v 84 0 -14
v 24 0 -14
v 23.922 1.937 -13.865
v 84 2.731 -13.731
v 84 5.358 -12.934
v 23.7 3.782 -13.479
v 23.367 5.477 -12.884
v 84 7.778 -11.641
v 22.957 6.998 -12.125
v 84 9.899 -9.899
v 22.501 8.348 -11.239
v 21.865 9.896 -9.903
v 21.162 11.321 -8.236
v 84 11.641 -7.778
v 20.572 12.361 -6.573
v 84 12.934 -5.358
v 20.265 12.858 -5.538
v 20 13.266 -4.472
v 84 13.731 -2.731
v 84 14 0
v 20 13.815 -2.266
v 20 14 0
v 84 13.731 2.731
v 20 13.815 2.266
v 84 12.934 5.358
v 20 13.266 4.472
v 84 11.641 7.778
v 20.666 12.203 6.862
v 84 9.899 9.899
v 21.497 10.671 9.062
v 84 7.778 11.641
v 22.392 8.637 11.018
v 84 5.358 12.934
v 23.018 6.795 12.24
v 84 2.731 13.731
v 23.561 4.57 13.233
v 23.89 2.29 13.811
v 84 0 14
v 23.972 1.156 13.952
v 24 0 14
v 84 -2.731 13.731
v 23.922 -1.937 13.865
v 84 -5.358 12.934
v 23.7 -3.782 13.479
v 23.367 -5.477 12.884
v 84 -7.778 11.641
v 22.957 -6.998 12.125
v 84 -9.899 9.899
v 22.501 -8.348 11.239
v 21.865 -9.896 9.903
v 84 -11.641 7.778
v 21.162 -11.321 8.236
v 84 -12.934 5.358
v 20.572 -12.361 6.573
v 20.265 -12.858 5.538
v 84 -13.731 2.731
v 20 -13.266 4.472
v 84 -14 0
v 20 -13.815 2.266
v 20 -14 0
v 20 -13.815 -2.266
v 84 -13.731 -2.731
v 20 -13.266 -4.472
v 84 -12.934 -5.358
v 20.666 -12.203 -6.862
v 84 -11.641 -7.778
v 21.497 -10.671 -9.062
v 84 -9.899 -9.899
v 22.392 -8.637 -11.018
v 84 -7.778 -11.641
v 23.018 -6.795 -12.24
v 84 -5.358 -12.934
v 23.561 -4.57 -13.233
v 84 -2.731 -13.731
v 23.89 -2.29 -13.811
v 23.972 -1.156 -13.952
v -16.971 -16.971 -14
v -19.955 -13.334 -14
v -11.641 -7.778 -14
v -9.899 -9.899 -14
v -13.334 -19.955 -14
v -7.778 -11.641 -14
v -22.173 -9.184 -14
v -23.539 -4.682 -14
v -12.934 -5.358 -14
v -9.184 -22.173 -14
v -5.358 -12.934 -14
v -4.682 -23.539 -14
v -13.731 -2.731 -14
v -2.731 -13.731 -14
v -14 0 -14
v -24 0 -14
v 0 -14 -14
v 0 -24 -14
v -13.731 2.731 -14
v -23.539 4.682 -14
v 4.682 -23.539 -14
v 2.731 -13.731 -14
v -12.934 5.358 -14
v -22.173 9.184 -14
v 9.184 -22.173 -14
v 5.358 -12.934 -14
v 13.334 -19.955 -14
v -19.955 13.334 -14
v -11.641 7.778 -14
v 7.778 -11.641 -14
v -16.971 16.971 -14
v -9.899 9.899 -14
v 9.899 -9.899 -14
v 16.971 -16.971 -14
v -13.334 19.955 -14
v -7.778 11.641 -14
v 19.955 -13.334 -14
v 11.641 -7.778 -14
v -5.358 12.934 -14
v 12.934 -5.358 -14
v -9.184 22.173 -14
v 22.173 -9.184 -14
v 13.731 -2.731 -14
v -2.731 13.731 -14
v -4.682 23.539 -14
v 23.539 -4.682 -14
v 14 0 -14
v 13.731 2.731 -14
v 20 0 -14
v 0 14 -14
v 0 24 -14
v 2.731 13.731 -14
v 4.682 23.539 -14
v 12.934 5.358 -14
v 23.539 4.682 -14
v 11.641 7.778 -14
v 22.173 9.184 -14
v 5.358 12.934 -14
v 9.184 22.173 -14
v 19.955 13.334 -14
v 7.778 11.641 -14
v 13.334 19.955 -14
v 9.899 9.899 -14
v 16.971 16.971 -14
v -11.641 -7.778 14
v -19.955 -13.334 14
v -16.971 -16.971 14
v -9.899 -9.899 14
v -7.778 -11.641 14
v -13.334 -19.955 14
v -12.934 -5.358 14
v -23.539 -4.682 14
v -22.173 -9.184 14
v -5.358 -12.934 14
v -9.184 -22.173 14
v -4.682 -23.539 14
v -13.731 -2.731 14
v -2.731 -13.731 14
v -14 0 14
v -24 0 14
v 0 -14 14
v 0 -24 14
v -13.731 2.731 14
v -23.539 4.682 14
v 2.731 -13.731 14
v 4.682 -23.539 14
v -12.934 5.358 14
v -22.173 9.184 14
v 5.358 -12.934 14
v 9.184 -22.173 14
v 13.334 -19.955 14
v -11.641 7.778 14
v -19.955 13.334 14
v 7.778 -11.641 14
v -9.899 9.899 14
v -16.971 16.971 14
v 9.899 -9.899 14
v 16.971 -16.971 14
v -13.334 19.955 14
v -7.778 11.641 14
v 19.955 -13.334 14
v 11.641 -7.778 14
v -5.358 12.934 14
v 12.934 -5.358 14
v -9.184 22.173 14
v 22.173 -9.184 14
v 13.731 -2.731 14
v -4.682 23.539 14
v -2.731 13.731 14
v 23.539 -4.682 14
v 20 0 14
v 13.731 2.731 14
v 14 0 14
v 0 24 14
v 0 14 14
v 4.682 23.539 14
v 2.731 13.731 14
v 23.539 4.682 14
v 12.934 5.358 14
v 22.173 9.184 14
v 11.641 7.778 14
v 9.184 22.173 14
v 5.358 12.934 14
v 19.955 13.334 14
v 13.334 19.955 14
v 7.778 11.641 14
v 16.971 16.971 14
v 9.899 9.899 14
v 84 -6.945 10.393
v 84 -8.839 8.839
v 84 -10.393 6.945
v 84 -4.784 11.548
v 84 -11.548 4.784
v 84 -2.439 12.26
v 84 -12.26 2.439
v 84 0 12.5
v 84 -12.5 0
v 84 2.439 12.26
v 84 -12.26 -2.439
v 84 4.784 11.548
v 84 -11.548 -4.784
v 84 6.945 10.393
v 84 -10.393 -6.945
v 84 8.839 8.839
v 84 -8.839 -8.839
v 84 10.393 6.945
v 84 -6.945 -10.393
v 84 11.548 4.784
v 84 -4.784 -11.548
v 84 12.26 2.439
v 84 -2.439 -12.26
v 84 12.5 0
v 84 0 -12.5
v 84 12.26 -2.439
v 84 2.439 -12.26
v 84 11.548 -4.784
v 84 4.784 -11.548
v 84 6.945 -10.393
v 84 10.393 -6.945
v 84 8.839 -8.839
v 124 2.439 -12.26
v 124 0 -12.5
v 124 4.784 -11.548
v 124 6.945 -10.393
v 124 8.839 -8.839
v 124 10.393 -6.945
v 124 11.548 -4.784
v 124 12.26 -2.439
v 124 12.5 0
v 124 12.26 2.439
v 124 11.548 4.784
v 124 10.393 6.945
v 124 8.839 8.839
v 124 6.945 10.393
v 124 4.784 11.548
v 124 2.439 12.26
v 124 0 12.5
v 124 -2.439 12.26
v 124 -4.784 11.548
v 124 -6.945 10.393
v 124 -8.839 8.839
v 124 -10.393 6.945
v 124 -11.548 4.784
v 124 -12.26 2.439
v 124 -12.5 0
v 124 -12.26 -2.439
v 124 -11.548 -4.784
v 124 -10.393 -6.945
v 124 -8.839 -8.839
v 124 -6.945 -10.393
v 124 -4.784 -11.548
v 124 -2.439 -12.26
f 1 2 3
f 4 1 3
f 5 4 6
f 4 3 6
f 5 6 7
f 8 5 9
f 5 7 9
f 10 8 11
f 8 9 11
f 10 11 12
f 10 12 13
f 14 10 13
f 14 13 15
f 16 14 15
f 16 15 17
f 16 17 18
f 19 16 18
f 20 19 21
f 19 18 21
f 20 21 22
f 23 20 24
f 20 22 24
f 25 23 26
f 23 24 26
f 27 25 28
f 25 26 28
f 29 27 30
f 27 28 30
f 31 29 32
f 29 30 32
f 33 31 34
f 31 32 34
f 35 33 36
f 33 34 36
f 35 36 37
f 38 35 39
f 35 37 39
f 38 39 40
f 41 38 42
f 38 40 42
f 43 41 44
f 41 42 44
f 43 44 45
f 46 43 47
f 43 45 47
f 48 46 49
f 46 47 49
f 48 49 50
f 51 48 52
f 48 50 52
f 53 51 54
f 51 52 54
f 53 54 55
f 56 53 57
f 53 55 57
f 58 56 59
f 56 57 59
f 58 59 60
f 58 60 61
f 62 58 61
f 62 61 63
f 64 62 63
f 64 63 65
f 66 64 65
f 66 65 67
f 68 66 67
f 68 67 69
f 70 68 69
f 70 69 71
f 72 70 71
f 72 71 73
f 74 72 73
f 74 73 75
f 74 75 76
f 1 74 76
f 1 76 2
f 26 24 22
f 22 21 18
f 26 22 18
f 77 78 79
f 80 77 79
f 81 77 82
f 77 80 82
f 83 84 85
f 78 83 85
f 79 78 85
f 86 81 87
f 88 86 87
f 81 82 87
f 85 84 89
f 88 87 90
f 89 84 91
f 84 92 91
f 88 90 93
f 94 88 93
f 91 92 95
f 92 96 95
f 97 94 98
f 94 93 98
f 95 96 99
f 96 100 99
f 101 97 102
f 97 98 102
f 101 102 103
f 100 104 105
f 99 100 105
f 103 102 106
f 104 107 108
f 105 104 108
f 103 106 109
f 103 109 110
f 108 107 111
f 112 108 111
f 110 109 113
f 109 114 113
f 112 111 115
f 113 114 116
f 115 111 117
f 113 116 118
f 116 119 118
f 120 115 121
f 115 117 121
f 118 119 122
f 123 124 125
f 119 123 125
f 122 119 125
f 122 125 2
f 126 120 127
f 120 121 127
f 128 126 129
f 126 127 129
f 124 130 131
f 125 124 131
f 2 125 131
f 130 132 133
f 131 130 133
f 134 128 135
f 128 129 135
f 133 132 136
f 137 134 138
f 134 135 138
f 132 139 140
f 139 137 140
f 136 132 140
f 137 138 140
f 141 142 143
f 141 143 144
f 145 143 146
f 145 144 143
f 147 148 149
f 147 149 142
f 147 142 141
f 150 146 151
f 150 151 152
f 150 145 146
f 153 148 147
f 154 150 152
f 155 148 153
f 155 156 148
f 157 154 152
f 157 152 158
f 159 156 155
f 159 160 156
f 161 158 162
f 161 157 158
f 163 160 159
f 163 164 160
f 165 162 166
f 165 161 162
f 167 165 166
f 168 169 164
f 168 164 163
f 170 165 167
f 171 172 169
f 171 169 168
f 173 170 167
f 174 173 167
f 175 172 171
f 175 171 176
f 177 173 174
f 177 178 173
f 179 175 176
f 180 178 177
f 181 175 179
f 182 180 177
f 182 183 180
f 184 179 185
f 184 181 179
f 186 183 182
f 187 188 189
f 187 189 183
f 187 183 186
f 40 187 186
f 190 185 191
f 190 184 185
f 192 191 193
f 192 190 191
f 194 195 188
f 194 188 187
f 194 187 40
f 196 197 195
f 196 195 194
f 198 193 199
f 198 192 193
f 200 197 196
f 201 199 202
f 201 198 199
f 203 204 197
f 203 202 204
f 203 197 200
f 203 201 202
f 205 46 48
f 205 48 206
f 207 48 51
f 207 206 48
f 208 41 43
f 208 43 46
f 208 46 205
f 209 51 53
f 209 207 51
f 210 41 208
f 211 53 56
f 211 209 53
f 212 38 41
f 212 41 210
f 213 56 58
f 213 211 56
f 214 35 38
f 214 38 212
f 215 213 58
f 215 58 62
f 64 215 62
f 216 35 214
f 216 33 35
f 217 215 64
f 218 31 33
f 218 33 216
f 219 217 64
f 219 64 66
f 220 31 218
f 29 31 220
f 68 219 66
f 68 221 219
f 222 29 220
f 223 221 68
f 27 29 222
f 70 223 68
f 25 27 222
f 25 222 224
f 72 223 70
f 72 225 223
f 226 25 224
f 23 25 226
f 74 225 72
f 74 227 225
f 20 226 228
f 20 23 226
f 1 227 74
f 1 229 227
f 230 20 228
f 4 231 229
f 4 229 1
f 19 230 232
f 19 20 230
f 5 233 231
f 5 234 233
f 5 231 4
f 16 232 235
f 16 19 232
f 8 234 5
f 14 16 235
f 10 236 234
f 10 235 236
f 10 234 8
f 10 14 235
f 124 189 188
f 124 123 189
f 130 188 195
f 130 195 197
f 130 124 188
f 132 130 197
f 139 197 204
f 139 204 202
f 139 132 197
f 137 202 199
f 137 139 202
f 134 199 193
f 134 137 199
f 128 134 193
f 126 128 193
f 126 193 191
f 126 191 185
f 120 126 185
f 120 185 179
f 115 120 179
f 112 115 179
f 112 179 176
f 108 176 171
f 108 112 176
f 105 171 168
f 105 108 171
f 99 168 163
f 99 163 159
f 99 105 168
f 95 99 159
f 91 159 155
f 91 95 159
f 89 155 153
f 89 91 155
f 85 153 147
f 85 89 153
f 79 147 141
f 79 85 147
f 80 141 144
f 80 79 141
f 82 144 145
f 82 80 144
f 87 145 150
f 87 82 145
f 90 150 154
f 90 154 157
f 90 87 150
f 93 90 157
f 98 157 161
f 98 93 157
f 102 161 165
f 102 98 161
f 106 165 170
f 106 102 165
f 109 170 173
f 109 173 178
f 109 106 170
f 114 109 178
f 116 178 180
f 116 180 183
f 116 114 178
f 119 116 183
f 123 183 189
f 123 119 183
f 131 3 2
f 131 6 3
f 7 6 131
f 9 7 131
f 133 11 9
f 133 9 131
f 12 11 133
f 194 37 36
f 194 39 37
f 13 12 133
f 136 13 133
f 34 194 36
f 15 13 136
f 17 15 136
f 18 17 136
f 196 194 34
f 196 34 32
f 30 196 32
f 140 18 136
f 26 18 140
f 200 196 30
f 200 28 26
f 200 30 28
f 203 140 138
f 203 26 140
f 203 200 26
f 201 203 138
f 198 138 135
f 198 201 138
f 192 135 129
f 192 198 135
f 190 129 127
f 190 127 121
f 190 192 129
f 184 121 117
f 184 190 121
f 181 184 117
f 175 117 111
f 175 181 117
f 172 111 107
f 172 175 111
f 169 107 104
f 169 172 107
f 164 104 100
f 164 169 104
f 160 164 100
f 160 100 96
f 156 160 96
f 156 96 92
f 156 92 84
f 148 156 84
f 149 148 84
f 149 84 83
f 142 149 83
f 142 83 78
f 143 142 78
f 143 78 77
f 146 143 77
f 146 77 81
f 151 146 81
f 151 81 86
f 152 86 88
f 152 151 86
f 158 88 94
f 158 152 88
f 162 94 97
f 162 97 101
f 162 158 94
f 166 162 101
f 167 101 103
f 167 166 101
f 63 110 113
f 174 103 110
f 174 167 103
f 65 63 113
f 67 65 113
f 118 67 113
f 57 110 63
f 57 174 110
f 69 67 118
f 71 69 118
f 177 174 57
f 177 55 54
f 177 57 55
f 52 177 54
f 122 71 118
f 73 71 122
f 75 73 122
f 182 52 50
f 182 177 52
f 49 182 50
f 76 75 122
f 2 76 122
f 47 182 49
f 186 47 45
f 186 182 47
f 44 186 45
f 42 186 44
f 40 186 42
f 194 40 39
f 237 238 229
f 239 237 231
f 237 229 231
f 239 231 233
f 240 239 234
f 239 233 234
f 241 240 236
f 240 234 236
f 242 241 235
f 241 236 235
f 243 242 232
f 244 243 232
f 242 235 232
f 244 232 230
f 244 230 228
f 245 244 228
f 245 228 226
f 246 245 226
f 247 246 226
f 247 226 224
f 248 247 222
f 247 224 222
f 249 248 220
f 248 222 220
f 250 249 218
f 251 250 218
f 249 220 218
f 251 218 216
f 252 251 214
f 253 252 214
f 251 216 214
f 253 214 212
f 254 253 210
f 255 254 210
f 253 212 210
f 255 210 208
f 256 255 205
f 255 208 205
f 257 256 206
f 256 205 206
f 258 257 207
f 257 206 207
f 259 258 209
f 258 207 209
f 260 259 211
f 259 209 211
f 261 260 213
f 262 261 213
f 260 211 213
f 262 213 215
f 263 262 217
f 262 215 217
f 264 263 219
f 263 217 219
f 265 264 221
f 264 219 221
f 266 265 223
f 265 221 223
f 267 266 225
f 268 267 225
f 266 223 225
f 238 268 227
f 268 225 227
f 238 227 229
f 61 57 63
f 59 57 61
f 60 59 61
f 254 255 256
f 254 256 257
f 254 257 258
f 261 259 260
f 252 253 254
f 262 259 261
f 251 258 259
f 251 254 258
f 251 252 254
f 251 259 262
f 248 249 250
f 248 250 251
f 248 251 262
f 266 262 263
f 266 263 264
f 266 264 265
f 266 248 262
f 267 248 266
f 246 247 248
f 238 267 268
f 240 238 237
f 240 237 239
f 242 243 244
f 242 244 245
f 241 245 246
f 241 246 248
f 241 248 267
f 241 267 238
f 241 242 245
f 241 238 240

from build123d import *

# Parameters (mm, degrees)
SKETCH1_R           = 24
SKETCH1_R_2         = 14
BOSS_EXTRUDE3_DEPTH = 14
BOSS_EXTRUDE7_START = 20
SKETCH5_R           = 14
BOSS_EXTRUDE7_DEPTH = 64
SKETCH7_R           = 12.5
BOSS_EXTRUDE8_DEPTH = 40


with BuildPart() as part:
    # Sketch1 → Boss-Extrude3 (new body, symmetric)
    with BuildSketch(Plane.XY):
        Circle(SKETCH1_R)
        Circle(SKETCH1_R_2, mode=Mode.SUBTRACT)
    extrude(amount=BOSS_EXTRUDE3_DEPTH, both=True)

    # Sketch5 → Boss-Extrude7 (add)
    with BuildSketch(Plane(origin=(0, 0, 0), x_dir=(0, 0, -1), z_dir=(1, 0, 0)).offset(BOSS_EXTRUDE7_START)):
        Circle(SKETCH5_R)
    extrude(amount=BOSS_EXTRUDE7_DEPTH)

    # Sketch7 → Boss-Extrude8 (add)
    with BuildSketch(Plane(origin=(84, 0, 0), x_dir=(0, 0, -1), z_dir=(1, 0, 0))):
        Circle(SKETCH7_R)
    extrude(amount=BOSS_EXTRUDE8_DEPTH)


solid = part.part
